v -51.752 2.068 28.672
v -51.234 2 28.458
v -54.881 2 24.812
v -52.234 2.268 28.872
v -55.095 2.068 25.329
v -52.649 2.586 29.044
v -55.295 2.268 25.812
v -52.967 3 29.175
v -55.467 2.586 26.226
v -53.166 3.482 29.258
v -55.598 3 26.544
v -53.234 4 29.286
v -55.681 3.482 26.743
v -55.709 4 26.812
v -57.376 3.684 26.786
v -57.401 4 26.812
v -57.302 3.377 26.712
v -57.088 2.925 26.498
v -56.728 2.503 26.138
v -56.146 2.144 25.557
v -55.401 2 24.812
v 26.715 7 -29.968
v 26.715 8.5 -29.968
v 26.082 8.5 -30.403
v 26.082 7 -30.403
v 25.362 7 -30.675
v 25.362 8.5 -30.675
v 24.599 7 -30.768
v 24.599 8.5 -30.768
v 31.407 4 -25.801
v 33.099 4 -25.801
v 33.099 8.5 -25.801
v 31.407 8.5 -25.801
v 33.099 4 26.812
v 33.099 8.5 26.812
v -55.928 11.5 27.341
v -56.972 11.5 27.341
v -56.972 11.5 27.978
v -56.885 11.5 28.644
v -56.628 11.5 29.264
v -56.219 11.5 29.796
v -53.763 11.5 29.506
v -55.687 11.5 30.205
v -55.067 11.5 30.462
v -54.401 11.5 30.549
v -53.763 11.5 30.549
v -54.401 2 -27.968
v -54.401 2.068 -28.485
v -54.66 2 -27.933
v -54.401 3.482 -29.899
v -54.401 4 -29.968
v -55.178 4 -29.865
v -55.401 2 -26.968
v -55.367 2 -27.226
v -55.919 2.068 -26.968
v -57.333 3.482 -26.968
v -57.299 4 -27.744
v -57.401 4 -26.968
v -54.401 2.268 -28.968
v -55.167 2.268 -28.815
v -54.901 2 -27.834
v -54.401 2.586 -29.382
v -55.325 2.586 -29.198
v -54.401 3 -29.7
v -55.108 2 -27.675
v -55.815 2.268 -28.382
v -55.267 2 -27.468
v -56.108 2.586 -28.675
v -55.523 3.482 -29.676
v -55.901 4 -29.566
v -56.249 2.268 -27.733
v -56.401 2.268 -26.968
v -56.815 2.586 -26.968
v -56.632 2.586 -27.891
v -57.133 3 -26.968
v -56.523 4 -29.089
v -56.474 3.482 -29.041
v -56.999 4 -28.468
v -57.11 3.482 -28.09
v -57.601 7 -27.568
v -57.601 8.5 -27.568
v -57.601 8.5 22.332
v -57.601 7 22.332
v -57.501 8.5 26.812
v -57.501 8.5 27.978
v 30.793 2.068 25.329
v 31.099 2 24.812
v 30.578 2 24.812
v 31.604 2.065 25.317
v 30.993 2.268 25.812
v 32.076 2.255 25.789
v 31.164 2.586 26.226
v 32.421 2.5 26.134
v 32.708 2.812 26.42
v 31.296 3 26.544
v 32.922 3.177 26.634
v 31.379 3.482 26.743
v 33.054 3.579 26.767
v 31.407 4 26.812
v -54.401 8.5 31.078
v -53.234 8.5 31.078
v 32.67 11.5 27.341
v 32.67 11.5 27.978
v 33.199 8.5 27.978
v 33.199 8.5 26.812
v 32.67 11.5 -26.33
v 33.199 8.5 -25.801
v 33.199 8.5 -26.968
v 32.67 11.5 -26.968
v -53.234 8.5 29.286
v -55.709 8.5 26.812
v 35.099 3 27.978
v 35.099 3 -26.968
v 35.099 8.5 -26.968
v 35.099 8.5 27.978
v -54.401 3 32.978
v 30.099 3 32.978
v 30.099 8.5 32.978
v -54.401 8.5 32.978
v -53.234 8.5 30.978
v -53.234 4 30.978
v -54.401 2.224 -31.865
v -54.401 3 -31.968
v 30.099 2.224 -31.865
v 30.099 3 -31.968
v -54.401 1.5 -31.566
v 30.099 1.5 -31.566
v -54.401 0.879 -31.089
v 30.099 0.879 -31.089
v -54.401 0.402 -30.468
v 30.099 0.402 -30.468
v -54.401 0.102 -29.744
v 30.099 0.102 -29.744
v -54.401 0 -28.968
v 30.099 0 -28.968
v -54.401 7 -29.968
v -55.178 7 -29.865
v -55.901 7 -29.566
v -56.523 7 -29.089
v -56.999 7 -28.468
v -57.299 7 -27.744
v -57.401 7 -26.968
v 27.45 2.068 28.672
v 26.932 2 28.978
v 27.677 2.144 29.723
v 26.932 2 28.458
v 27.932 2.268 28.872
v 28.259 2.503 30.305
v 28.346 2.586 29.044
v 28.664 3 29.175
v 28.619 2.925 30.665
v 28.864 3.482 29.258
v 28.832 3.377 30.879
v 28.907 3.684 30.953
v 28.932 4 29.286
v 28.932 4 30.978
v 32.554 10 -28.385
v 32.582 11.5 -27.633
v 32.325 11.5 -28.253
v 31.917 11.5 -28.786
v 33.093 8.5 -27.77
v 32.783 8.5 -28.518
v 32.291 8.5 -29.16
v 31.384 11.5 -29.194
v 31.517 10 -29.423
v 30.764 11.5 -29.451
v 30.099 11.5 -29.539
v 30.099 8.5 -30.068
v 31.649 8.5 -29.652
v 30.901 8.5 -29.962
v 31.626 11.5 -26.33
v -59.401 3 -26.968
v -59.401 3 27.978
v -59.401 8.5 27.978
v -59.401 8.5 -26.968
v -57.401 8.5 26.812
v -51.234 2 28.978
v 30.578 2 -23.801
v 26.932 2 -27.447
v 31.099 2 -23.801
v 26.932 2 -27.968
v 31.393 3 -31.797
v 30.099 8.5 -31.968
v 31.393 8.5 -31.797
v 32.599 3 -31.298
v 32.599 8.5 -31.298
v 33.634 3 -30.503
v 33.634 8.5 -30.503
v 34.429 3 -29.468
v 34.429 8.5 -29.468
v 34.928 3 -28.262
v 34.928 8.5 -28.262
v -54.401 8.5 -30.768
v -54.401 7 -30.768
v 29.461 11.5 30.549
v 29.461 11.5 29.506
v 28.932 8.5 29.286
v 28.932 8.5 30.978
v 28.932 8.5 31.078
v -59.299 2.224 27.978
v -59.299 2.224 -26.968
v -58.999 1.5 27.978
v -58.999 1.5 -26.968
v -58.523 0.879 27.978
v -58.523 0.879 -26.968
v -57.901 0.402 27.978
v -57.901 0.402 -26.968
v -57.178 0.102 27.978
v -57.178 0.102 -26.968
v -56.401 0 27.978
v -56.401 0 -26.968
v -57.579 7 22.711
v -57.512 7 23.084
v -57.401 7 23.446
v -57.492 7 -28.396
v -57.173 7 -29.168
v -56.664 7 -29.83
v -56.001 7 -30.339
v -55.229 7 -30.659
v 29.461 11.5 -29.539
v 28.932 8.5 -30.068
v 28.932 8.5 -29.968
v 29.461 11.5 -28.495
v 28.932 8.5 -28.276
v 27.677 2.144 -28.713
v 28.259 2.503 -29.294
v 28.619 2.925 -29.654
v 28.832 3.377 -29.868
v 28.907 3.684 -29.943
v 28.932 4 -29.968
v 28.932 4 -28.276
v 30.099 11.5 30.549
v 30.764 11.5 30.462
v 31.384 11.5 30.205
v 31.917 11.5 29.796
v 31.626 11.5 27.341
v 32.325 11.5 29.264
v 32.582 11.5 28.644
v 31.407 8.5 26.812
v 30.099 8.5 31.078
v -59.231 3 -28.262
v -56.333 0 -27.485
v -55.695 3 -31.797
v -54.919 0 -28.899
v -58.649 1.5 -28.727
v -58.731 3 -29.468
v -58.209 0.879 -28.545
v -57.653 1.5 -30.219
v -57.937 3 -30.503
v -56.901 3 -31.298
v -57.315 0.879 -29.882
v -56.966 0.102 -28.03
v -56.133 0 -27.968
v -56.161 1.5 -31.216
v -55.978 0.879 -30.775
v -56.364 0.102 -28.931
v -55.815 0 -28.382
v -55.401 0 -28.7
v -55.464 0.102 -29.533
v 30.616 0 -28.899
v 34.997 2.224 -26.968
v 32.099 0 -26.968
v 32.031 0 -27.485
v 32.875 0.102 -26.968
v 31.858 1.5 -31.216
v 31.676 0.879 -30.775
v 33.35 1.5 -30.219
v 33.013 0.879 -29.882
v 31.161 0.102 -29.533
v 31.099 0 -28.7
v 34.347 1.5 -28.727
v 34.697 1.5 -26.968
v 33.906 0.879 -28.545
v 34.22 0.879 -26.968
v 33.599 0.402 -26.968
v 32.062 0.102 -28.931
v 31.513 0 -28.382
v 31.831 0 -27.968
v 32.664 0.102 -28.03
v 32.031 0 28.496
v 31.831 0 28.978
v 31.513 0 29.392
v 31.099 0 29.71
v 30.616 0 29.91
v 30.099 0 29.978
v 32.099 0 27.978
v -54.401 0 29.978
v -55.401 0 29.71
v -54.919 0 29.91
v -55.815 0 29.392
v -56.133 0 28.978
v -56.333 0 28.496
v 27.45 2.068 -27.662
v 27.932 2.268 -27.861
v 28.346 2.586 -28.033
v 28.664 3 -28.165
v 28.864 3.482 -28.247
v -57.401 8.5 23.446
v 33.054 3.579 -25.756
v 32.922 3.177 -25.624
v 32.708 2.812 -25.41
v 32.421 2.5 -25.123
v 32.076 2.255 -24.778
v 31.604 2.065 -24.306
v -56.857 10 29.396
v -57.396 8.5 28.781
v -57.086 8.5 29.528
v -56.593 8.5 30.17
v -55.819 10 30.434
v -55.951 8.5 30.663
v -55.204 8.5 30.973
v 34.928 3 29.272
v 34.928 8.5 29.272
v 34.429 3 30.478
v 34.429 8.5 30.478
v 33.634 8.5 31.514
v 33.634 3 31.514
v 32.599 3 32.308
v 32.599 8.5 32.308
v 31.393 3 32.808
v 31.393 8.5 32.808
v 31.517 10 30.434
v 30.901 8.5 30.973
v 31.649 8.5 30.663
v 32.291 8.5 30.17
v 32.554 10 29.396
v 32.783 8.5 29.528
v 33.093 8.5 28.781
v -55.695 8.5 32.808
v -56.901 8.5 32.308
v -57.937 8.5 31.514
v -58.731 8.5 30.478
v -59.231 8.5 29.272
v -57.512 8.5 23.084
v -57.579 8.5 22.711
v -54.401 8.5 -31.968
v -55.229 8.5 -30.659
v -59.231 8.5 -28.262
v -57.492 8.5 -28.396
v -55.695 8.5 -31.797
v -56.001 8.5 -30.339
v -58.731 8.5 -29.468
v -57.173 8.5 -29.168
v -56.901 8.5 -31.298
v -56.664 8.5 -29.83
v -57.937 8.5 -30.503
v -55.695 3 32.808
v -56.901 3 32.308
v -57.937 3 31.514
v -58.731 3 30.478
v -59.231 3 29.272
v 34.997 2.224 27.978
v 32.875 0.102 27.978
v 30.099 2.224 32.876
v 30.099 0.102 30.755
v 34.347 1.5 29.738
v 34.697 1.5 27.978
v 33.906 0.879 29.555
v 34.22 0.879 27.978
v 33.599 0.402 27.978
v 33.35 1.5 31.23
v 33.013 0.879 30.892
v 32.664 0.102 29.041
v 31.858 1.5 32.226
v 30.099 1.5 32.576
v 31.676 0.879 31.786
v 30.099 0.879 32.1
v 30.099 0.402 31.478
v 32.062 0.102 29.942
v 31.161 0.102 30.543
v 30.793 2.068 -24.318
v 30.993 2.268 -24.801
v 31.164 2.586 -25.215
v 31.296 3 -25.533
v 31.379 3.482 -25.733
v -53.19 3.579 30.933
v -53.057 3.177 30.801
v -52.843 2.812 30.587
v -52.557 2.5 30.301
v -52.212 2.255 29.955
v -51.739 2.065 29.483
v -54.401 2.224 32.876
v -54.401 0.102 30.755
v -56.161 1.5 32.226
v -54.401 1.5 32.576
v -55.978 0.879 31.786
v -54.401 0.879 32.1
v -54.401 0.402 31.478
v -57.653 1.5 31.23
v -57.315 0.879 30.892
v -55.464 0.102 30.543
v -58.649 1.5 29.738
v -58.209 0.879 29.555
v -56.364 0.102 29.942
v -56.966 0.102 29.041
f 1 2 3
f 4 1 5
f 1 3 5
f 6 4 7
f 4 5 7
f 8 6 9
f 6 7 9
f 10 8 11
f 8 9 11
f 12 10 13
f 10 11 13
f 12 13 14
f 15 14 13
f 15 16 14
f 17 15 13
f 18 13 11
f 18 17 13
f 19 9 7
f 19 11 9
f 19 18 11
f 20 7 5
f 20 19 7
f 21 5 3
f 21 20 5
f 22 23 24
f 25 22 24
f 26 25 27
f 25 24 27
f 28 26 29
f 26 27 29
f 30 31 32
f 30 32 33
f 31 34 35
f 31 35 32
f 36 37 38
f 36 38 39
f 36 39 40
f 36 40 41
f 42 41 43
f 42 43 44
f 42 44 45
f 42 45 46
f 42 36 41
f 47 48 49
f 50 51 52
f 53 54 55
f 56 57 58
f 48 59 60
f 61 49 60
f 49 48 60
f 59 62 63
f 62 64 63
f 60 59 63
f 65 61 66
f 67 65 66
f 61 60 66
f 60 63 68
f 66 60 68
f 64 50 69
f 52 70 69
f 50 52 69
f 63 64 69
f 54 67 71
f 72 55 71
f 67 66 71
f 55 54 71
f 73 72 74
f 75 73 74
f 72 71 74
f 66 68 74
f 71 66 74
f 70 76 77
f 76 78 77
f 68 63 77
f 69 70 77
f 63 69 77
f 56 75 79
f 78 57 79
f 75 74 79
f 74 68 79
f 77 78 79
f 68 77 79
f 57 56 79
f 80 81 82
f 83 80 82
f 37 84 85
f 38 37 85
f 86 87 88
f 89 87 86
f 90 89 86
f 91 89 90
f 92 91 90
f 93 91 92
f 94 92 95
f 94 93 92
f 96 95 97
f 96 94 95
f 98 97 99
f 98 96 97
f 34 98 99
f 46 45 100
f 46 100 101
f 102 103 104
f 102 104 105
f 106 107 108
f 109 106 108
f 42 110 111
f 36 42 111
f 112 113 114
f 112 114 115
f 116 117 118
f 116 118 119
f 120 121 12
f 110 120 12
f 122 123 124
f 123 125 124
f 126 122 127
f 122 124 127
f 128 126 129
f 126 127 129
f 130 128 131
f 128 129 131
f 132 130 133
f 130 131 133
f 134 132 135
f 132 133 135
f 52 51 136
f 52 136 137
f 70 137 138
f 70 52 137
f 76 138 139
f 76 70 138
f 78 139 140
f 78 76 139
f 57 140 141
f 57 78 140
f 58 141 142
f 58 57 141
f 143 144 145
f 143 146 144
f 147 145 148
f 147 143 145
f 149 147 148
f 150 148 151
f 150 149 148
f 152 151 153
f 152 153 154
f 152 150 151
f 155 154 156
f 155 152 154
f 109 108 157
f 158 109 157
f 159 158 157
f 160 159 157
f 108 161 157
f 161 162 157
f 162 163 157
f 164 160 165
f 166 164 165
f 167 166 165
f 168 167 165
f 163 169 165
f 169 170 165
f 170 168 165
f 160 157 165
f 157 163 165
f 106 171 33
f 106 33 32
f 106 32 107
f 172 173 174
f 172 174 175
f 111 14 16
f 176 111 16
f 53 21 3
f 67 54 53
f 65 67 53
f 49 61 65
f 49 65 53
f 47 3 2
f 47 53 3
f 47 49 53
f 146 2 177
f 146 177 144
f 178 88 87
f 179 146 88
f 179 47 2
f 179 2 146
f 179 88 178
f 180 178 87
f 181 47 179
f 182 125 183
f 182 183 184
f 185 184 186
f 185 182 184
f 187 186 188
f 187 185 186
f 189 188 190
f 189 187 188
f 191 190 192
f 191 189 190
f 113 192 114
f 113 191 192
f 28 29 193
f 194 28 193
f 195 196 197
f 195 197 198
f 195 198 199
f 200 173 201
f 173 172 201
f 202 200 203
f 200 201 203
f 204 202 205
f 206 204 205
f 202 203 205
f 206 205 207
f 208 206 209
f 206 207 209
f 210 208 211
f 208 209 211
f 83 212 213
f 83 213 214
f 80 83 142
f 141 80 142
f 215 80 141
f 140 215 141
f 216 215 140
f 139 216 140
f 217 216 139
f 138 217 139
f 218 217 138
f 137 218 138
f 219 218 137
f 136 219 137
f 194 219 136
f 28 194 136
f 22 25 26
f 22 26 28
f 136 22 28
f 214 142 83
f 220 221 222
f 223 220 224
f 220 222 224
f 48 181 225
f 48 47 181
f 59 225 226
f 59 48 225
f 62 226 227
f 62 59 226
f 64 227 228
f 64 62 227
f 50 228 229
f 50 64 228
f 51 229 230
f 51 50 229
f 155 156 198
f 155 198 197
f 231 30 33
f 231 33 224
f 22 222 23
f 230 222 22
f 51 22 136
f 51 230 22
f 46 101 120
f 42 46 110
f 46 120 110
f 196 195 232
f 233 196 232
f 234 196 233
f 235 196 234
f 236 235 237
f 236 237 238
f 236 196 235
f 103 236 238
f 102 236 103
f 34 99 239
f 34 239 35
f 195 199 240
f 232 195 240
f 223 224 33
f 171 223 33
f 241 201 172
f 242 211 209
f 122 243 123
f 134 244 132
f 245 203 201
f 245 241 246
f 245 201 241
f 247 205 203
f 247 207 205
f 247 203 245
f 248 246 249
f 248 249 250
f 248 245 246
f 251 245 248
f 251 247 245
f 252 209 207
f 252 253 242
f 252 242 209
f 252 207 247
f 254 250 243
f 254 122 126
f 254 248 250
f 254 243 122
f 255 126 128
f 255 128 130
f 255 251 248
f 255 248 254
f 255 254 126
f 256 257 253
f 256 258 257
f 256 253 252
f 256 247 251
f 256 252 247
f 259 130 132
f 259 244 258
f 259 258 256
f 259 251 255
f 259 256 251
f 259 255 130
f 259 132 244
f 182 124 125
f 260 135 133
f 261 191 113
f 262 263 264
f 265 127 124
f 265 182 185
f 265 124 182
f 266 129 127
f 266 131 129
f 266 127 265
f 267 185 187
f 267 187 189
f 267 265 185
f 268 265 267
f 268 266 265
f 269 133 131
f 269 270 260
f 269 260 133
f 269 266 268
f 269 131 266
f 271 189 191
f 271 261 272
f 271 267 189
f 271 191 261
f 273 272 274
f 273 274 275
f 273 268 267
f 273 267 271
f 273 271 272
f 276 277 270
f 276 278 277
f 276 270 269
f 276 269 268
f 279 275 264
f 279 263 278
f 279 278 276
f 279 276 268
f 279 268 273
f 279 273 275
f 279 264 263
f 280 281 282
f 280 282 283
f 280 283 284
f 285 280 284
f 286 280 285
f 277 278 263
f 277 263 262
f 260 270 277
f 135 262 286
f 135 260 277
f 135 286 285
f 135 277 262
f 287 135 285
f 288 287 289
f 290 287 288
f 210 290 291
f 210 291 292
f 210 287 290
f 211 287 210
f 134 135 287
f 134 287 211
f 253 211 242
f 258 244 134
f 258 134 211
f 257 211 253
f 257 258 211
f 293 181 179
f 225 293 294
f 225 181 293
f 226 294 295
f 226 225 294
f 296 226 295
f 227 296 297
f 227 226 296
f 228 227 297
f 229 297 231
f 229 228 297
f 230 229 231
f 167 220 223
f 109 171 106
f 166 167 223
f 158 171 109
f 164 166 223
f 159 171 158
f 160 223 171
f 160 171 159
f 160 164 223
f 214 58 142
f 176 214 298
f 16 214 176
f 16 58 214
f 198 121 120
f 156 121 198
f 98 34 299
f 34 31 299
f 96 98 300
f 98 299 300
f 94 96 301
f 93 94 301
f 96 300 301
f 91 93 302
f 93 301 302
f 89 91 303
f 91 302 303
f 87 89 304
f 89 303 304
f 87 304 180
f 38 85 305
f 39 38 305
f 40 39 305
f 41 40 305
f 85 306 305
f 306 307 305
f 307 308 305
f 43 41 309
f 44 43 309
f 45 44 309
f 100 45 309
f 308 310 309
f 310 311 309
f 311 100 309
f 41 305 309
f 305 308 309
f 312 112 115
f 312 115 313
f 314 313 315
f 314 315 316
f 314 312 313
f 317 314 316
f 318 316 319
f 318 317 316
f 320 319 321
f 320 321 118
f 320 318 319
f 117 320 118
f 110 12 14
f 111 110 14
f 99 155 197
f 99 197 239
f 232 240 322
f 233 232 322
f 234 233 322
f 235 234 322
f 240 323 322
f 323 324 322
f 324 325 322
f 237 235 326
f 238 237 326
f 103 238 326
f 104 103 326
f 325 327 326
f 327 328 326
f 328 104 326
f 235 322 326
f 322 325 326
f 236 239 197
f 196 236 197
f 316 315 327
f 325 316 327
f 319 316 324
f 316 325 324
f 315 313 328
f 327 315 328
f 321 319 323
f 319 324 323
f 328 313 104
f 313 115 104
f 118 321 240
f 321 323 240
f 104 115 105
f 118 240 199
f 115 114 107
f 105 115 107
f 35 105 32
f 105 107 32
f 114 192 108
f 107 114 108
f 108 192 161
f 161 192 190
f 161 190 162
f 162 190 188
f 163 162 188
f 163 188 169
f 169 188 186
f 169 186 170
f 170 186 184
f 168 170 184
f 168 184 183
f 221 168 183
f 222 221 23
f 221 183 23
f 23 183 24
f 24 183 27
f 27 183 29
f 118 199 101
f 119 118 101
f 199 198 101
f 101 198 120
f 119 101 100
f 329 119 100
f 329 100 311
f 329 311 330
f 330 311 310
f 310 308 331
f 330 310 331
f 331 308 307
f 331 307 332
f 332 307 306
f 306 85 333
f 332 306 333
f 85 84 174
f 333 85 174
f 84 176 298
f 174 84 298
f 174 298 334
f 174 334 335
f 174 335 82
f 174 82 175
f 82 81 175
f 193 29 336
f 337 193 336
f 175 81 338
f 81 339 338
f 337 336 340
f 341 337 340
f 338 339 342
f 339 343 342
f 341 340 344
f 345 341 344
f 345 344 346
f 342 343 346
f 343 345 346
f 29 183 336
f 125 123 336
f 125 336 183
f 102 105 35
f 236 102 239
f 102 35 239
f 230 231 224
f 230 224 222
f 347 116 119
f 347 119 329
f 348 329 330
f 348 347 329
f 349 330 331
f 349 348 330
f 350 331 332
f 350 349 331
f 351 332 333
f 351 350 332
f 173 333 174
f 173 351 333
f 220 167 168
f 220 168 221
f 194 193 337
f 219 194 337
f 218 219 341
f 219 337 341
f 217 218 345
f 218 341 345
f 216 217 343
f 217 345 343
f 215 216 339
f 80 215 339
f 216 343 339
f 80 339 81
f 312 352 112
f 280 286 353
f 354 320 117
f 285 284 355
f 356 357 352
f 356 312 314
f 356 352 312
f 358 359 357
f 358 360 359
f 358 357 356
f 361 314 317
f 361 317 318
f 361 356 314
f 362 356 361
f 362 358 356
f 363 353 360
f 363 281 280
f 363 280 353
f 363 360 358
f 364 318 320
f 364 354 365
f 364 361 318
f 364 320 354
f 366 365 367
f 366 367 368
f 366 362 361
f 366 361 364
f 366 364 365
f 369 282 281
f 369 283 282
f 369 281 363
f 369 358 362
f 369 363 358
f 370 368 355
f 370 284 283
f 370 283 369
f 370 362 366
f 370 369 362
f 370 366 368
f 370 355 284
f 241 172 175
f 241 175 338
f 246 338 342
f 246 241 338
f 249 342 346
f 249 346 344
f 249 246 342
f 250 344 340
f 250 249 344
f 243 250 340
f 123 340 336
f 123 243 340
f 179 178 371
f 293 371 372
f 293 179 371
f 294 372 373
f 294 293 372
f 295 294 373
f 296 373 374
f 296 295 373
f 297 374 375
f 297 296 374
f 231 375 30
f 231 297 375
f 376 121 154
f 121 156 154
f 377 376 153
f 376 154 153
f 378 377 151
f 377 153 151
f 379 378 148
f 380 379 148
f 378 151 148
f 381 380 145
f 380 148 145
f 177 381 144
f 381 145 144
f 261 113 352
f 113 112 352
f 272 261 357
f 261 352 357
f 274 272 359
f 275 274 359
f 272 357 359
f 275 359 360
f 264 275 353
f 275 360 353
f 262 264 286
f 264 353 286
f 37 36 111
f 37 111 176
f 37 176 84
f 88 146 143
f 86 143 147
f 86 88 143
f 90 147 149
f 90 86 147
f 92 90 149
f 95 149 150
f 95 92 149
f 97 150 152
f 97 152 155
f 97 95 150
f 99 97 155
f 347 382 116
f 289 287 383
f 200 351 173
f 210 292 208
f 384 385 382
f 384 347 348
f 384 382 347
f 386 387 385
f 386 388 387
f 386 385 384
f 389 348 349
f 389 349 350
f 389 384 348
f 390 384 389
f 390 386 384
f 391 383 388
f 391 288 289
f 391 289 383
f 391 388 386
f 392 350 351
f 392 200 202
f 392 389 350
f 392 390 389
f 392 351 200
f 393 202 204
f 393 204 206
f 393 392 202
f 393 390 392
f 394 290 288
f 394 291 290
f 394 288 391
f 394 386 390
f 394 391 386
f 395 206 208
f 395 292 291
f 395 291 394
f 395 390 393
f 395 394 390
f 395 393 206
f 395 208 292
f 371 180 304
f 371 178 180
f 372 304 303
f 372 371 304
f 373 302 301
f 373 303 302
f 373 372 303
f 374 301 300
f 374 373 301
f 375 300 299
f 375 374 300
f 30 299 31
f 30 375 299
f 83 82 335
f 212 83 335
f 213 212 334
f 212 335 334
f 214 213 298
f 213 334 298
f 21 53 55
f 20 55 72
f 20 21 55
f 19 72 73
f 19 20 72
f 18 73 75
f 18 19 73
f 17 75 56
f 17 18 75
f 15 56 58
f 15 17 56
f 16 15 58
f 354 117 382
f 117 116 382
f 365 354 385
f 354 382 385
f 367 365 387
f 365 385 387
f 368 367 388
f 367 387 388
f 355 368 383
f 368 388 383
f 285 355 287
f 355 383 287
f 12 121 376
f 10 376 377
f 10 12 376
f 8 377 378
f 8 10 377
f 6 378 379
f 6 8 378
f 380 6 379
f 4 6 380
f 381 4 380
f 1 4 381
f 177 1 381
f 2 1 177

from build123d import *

# Parameters (mm, degrees)
BOSS_EXTRUDE1_DEPTH           = 2
BOSS_EXTRUDE2_DEPTH           = 8.5
CUT_EXTRUDE1_DEPTH            = 1.5
BOSS_EXTRUDE3_DEPTH           = 6.5
BOSS_EXTRUDE4_START           = 6.5
BOSS_EXTRUDE4_DEPTH           = 3
BOSS_EXTRUDE4_DRAFT           = 10
BOSS_EXTRUDE4_PROFILE_2_DEPTH = 3
BOSS_EXTRUDE4_PROFILE_2_DRAFT = 10
BOSS_EXTRUDE4_PROFILE_3_DEPTH = 3
BOSS_EXTRUDE4_PROFILE_3_DRAFT = 10
FILLET1_R                     = 3
FILLET2_R                     = 2


with BuildPart() as part:
    # Sketch1 → Boss-Extrude1 (new body)
    with BuildSketch(Plane(origin=(0, 0, 0), x_dir=(1, 0, 0), z_dir=(0, 1, 0))):
        with BuildLine():
            Line((-54.401224723, -30.978253121), (30.098775277, -30.978253121))
            ThreePointArc((30.098775277, -30.978253121), (32.220095621, -30.099573464), (33.098775277, -27.978253121))
            Line((33.098775277, -27.978253121), (33.098775277, 26.967561283))
            ThreePointArc((33.098775277, 26.967561283), (32.220095621, 29.088881626), (30.098775277, 29.967561283))
            Line((30.098775277, 29.967561283), (-54.401224723, 29.967561283))
            ThreePointArc((-54.401224723, 29.967561283), (-56.522545066, 29.088881626), (-57.401224723, 26.967561283))
            Line((-57.401224723, 26.967561283), (-57.401224723, -27.978253121))
            ThreePointArc((-57.401224723, -27.978253121), (-56.522545066, -30.099573464), (-54.401224723, -30.978253121))
        make_face()
    extrude(amount=BOSS_EXTRUDE1_DEPTH)

    # Sketch1<3> → Boss-Extrude2 (add)
    with BuildSketch(Plane(origin=(0, 0, 0), x_dir=(1, 0, 0), z_dir=(0, 1, 0))):
        with BuildLine():
            Line((-54.401224723, 31.967561283), (30.098775277, 31.967561283))
            ThreePointArc((30.098775277, 31.967561283), (33.634309183, 30.503095189), (35.098775277, 26.967561283))
            Line((35.098775277, 26.967561283), (35.098775277, -27.978253121))
            ThreePointArc((35.098775277, -27.978253121), (33.634309183, -31.513787026), (30.098775277, -32.978253121))
            Line((30.098775277, -32.978253121), (-54.401224723, -32.978253121))
            ThreePointArc((-54.401224723, -32.978253121), (-57.936758629, -31.513787026), (-59.401224723, -27.978253121))
            Line((-59.401224723, -27.978253121), (-59.401224723, 26.967561283))
            ThreePointArc((-59.401224723, 26.967561283), (-57.936758629, 30.503095189), (-54.401224723, 31.967561283))
        make_face()
        with BuildLine():
            Line((-54.401224723, -30.978253121), (30.098775277, -30.978253121))
            ThreePointArc((30.098775277, -30.978253121), (32.220095621, -30.099573464), (33.098775277, -27.978253121))
            Line((33.098775277, -27.978253121), (33.098775277, 26.967561283))
            ThreePointArc((33.098775277, 26.967561283), (32.220095621, 29.088881626), (30.098775277, 29.967561283))
            Line((30.098775277, 29.967561283), (-54.401224723, 29.967561283))
            ThreePointArc((-54.401224723, 29.967561283), (-56.522545066, 29.088881626), (-57.401224723, 26.967561283))
            Line((-57.401224723, 26.967561283), (-57.401224723, -27.978253121))
            ThreePointArc((-57.401224723, -27.978253121), (-56.522545066, -30.099573464), (-54.401224723, -30.978253121))
        make_face(mode=Mode.SUBTRACT)
    extrude(amount=BOSS_EXTRUDE2_DEPTH)

    # Sketch2 → Cut-Extrude1 (cut)
    with BuildSketch(Plane(origin=(0, 8.5, 0), x_dir=(1, 0, 0), z_dir=(0, 1, 0))):
        with BuildLine():
            Line((27.798775277, -25.532438717), (27.798775277, 27.567561283))
            ThreePointArc((27.798775277, 27.567561283), (26.861516977, 29.830302983), (24.598775277, 30.767561283))
            Line((24.598775277, 30.767561283), (-54.401224723, 30.767561283))
            ThreePointArc((-54.401224723, 30.767561283), (-56.663966423, 29.830302983), (-57.601224723, 27.567561283))
            Line((-57.601224723, 27.567561283), (-57.601224723, -22.332438717))
            ThreePointArc((-57.601224723, -22.332438717), (-56.663966423, -24.595180417), (-54.401224723, -25.532438717))
            Line((-54.401224723, -25.532438717), (27.798775277, -25.532438717))
        make_face()
    extrude(amount=-CUT_EXTRUDE1_DEPTH, mode=Mode.SUBTRACT)

    # Sketch3 → Boss-Extrude3 (add)
    with BuildSketch(Plane(origin=(0, 2, 0), x_dir=(1, 0, 0), z_dir=(0, 1, 0))):
        with BuildLine():
            Line((28.932049088, -29.286400666), (31.406922822, -26.811526932))
            Line((31.406922822, -26.811526932), (33.198775277, -26.811526932))
            Line((33.198775277, -26.811526932), (33.198775277, -27.978253121))
            ThreePointArc((33.198775277, -27.978253121), (32.290806299, -30.170284142), (30.098775277, -31.078253121))
            Line((30.098775277, -31.078253121), (28.932049088, -31.078253121))
            Line((28.932049088, -31.078253121), (28.932049088, -29.286400666))
        make_face()
        with BuildLine():
            Line((31.406922822, 25.800835094), (28.932049088, 28.275708828))
            Line((28.932049088, 28.275708828), (28.932049088, 30.067561283))
            Line((28.932049088, 30.067561283), (30.098775277, 30.067561283))
            ThreePointArc((30.098775277, 30.067561283), (32.290806299, 29.159592304), (33.198775277, 26.967561283))
            Line((33.198775277, 26.967561283), (33.198775277, 25.800835094))
            Line((33.198775277, 25.800835094), (31.406922822, 25.800835094))
        make_face()
        with BuildLine():
            Line((-53.234498534, -29.286400666), (-55.709372268, -26.811526932))
            Line((-55.709372268, -26.811526932), (-57.501224723, -26.811526932))
            Line((-57.501224723, -26.811526932), (-57.501224723, -27.978253121))
            ThreePointArc((-57.501224723, -27.978253121), (-56.593255745, -30.170284142), (-54.401224723, -31.078253121))
            Line((-54.401224723, -31.078253121), (-53.234498534, -31.078253121))
            Line((-53.234498534, -31.078253121), (-53.234498534, -29.286400666))
        make_face()
    extrude(amount=BOSS_EXTRUDE3_DEPTH)


with BuildPart() as boss_extrude4_tool:
    # Sketch3<2> → Boss-Extrude4 (with draft: the straight prism first)
    with BuildSketch(Plane(origin=(0, 2, 0), x_dir=(1, 0, 0), z_dir=(0, 1, 0)).offset(BOSS_EXTRUDE4_START)):
        with BuildLine():
            Line((28.932049088, -29.286400666), (28.932049088, -31.078253121))
            Line((28.932049088, -31.078253121), (30.098775277, -31.078253121))
            ThreePointArc((30.098775277, -31.078253121), (32.290806299, -30.170284142), (33.198775277, -27.978253121))
            Line((33.198775277, -27.978253121), (33.198775277, -26.811526932))
            Line((33.198775277, -26.811526932), (31.406922822, -26.811526932))
            Line((31.406922822, -26.811526932), (28.932049088, -29.286400666))
        make_face()
    extrude(amount=BOSS_EXTRUDE4_DEPTH)
    # Boss-Extrude4: the draft: its side faces are tilted about the plane it starts from
    boss_extrude4_sides = [boss_extrude4_tool.faces().sort_by_distance(p)[0] for p in [
        (28.932049088, 10, 30.182326893),
        (29.515412183, 10, 31.078253121),
        (32.290806299, 10, 30.170284142),
        (33.198775277, 10, 27.394890026),
        (32.30284905, 10, 26.811526932),
        (30.169485955, 10, 28.048963799),
    ]]
    draft(boss_extrude4_sides, Plane(origin=(0, 2, 0), x_dir=(1, 0, 0), z_dir=(0, 1, 0)).offset(BOSS_EXTRUDE4_START), BOSS_EXTRUDE4_DRAFT)


with BuildPart() as part_1:
    add(part.part)

    # Boss-Extrude4: add boss_extrude4_tool
    add(boss_extrude4_tool.part)


with BuildPart() as boss_extrude4_profile_2_tool:
    # Sketch3<2> → Boss-Extrude4 profile 2 (with draft: the straight prism first)
    with BuildSketch(Plane(origin=(0, 2, 0), x_dir=(1, 0, 0), z_dir=(0, 1, 0)).offset(BOSS_EXTRUDE4_START)):
        with BuildLine():
            Line((31.406922822, 25.800835094), (33.198775277, 25.800835094))
            Line((33.198775277, 25.800835094), (33.198775277, 26.967561283))
            ThreePointArc((33.198775277, 26.967561283), (32.290806299, 29.159592304), (30.098775277, 30.067561283))
            Line((30.098775277, 30.067561283), (28.932049088, 30.067561283))
            Line((28.932049088, 30.067561283), (28.932049088, 28.275708828))
            Line((28.932049088, 28.275708828), (31.406922822, 25.800835094))
        make_face()
    extrude(amount=BOSS_EXTRUDE4_PROFILE_2_DEPTH)
    # Boss-Extrude4 profile 2: the draft: its side faces are tilted about the plane it starts from
    boss_extrude4_profile_2_sides = [boss_extrude4_profile_2_tool.faces().sort_by_distance(p)[0] for p in [
        (32.30284905, 10, -25.800835094),
        (33.198775277, 10, -26.384198188),
        (32.290806299, 10, -29.159592304),
        (29.515412183, 10, -30.067561283),
        (28.932049088, 10, -29.171635055),
        (30.169485955, 10, -27.038271961),
    ]]
    draft(boss_extrude4_profile_2_sides, Plane(origin=(0, 2, 0), x_dir=(1, 0, 0), z_dir=(0, 1, 0)).offset(BOSS_EXTRUDE4_START), BOSS_EXTRUDE4_PROFILE_2_DRAFT)


with BuildPart() as part_2:
    add(part_1.part)

    # Boss-Extrude4 profile 2: add boss_extrude4_profile_2_tool
    add(boss_extrude4_profile_2_tool.part)


with BuildPart() as boss_extrude4_profile_3_tool:
    # Sketch3<2> → Boss-Extrude4 profile 3 (with draft: the straight prism first)
    with BuildSketch(Plane(origin=(0, 2, 0), x_dir=(1, 0, 0), z_dir=(0, 1, 0)).offset(BOSS_EXTRUDE4_START)):
        with BuildLine():
            Line((-53.234498534, -29.286400666), (-55.709372268, -26.811526932))
            Line((-55.709372268, -26.811526932), (-57.501224723, -26.811526932))
            Line((-57.501224723, -26.811526932), (-57.501224723, -27.978253121))
            ThreePointArc((-57.501224723, -27.978253121), (-56.593255745, -30.170284142), (-54.401224723, -31.078253121))
            Line((-54.401224723, -31.078253121), (-53.234498534, -31.078253121))
            Line((-53.234498534, -31.078253121), (-53.234498534, -29.286400666))
        make_face()
    extrude(amount=BOSS_EXTRUDE4_PROFILE_3_DEPTH)
    # Boss-Extrude4 profile 3: the draft: its side faces are tilted about the plane it starts from
    boss_extrude4_profile_3_sides = [boss_extrude4_profile_3_tool.faces().sort_by_distance(p)[0] for p in [
        (-54.471935401, 10, 28.048963799),
        (-56.605298496, 10, 26.811526932),
        (-57.501224723, 10, 27.394890026),
        (-56.593255745, 10, 30.170284142),
        (-53.817861628, 10, 31.078253121),
        (-53.234498534, 10, 30.182326893),
    ]]
    draft(boss_extrude4_profile_3_sides, Plane(origin=(0, 2, 0), x_dir=(1, 0, 0), z_dir=(0, 1, 0)).offset(BOSS_EXTRUDE4_START), BOSS_EXTRUDE4_PROFILE_3_DRAFT)


with BuildPart() as part_3:
    add(part_2.part)

    # Boss-Extrude4 profile 3: add boss_extrude4_profile_3_tool
    add(boss_extrude4_profile_3_tool.part)

    # Fillet1
    fillet1_edges = [part_3.edges().sort_by_distance(p)[0] for p in [
        (-12.151224723, 0, -31.967561283),
        (33.634309183, 0, -30.503095189),
        (35.098775277, 0, 0.505345919),
        (33.634309183, 0, 31.513787026),
        (-12.151224723, 0, 32.978253121),
        (-57.936758629, 0, 31.513787026),
        (-59.401224723, 0, 0.505345919),
        (-57.936758629, 0, -30.503095189),
    ]]
    fillet(fillet1_edges, radius=FILLET1_R)

    # Fillet2
    fillet2_edges = [part_3.edges().sort_by_distance(p)[0] for p in [
        (-56.522545066, 2, -29.088881626),
        (33.098775277, 2, 0.505345919),
        (32.25284905, 2, 26.811526932),
        (30.169485955, 2, 28.048963799),
        (28.932049088, 2, 30.132326893),
        (-57.401224723, 2, -0.078017176),
        (-12.151224723, 2, 30.978253121),
        (-53.234498534, 2, 30.132326893),
        (-54.471935401, 2, 28.048963799),
        (-12.734587817, 2, -29.967561283),
        (-56.555298496, 2, 26.811526932),
        (28.932049088, 2, -29.121635055),
        (30.169485955, 2, -27.038271961),
        (32.25284905, 2, -25.800835094),
    ]]
    fillet(fillet2_edges, radius=FILLET2_R)


solid = part_3.part
